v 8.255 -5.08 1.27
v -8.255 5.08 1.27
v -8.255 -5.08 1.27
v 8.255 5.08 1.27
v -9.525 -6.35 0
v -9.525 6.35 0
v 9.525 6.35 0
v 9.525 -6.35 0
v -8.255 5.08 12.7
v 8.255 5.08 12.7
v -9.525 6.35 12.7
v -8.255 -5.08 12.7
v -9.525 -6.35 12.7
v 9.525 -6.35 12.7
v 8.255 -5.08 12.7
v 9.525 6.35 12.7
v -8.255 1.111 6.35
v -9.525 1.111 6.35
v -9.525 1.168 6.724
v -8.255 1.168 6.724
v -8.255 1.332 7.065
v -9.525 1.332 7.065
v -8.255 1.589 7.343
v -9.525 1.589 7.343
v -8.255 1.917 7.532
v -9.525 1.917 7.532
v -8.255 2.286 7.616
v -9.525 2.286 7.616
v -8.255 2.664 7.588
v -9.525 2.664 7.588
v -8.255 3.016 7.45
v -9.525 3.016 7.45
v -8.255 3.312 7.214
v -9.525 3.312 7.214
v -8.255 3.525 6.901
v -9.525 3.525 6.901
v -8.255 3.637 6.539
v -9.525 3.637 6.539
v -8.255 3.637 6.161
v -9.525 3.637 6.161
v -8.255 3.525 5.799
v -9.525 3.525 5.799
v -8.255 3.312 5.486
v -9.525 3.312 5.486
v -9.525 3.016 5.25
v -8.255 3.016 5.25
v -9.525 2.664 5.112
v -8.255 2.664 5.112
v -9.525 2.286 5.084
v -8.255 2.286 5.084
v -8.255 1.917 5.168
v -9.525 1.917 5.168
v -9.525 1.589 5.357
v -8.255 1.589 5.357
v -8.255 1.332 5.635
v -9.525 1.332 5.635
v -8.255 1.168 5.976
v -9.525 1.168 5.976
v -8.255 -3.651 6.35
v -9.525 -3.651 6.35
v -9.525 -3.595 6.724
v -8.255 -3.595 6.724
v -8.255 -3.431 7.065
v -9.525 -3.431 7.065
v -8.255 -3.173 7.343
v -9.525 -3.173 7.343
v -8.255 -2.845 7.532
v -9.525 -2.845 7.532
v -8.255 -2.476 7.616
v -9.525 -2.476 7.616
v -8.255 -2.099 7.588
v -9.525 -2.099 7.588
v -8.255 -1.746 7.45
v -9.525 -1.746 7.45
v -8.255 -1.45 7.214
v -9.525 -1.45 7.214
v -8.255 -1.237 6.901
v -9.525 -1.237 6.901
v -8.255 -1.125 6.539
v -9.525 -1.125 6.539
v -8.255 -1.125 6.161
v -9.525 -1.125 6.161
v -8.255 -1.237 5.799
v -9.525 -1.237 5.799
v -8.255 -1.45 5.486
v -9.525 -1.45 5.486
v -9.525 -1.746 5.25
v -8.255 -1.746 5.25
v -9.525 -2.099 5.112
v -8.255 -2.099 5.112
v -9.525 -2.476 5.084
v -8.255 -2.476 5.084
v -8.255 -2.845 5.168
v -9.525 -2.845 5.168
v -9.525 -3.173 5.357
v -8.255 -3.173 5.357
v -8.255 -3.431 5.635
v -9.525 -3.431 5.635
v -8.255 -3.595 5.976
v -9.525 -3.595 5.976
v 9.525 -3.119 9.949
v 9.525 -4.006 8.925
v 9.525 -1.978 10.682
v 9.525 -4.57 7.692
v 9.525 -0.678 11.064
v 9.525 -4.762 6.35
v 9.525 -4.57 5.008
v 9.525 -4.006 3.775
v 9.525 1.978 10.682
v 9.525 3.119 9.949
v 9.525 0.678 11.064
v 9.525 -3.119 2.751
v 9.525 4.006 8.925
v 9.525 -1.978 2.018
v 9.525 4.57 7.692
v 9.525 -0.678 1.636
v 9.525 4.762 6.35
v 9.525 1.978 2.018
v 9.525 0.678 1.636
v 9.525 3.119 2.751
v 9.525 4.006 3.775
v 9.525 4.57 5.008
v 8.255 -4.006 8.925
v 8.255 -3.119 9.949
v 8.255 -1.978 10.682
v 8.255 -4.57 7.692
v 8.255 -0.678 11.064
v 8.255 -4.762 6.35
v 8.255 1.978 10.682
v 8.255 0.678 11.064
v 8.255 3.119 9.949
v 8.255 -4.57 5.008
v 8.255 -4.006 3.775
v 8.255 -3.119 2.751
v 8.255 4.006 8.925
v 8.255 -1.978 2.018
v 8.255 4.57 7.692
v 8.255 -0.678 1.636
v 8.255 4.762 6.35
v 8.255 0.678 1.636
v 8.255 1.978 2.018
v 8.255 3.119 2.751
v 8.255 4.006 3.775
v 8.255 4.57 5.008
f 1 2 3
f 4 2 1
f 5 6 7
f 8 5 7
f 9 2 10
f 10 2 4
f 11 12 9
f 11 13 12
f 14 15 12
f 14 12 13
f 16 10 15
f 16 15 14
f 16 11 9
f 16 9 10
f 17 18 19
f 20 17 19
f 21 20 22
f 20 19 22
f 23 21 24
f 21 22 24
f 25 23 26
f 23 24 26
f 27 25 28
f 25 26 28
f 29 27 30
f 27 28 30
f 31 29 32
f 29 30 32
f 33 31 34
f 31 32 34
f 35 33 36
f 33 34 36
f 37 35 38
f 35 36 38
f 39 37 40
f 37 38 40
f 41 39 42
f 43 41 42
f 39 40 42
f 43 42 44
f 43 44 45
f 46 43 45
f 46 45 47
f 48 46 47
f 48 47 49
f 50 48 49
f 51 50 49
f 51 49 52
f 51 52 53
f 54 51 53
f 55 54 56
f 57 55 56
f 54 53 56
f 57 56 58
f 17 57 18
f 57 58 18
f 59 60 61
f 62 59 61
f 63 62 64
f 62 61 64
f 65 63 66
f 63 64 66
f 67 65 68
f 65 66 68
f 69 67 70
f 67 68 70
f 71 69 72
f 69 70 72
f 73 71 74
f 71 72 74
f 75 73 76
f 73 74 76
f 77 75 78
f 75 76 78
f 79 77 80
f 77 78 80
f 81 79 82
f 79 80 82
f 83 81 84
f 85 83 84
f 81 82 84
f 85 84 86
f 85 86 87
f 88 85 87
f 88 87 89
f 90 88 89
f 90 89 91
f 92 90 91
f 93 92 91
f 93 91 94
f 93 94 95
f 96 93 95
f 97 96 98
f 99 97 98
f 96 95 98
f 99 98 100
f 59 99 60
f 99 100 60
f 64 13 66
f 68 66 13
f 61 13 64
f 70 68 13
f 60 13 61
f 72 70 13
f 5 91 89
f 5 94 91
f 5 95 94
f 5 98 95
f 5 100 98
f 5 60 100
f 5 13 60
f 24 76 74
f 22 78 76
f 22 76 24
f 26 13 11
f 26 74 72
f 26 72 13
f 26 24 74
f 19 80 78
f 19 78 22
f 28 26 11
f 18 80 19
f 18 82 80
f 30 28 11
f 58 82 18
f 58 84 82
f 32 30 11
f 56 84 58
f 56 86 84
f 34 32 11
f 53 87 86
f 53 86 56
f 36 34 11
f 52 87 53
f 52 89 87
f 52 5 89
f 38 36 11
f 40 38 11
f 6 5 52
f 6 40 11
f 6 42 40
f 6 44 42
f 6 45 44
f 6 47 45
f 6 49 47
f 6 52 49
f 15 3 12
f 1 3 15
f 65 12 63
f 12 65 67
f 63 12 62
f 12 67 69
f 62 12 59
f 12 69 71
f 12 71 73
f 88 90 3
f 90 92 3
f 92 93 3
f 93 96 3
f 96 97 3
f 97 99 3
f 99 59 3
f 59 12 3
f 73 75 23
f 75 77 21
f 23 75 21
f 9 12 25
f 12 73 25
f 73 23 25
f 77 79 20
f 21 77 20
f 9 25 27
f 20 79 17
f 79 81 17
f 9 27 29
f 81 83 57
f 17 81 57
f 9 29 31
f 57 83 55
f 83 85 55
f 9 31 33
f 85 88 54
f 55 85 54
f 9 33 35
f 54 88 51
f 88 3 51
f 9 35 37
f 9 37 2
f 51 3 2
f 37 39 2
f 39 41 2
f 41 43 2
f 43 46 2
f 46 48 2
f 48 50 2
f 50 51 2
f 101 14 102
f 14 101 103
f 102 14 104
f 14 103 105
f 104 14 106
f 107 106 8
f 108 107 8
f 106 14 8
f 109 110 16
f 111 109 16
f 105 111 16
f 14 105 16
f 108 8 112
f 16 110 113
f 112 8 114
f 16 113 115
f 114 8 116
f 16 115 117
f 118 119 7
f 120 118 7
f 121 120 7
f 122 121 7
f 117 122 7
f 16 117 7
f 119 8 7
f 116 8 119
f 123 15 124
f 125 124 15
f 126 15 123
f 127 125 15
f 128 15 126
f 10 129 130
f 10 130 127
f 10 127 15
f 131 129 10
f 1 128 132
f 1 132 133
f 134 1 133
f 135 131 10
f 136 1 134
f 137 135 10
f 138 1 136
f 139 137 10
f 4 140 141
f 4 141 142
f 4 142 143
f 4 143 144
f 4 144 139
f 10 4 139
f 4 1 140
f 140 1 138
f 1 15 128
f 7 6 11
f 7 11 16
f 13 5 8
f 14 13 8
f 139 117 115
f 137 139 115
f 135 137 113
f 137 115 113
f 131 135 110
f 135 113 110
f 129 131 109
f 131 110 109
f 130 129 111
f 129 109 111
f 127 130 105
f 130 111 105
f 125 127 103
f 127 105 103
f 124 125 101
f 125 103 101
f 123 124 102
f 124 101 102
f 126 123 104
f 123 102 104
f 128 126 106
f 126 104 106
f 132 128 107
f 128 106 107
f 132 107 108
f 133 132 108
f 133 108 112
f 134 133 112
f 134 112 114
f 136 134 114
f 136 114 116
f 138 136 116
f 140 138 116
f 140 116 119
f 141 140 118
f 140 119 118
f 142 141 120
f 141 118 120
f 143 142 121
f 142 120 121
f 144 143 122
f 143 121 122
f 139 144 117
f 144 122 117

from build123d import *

# Parameters (mm, degrees)
F0_W     = 19.05
F0_H     = 12.7
F1_DEPTH = 12.7
F2_T     = -1.27
F3_R     = 4.7625
F4_DEPTH = 1.27
F5_R     = 1.27
F6_DEPTH = 1.27


with BuildPart() as f1:
    # F0 (on Top) → F1 (new body)
    with BuildSketch(Plane.XY):
        Rectangle(F0_W, F0_H)
    extrude(amount=F1_DEPTH)

    # F2
    f2_openings = [f1.faces().sort_by_distance(p)[0] for p in [
        (0, 0, 12.7),
    ]]
    offset(amount=F2_T, openings=f2_openings)

    # F3 (on face) → F4 (cut, through all)
    with BuildSketch(Plane.YZ.offset(9.525)):
        with Locations((0, 6.35)):
            Circle(F3_R)
    extrude(amount=-F4_DEPTH, mode=Mode.SUBTRACT)

    # F5 (on face) → F6 (cut, through all)
    with BuildSketch(Plane(origin=(-9.525, 0, 0), x_dir=(0, -1, 0), z_dir=(-1, 0, 0))):
        with Locations((-2.38125, 6.35)):
            Circle(F5_R)
        with Locations((2.38125, 6.35)):
            Circle(F5_R)
    extrude(amount=-F6_DEPTH, mode=Mode.SUBTRACT)


solid = f1.part
